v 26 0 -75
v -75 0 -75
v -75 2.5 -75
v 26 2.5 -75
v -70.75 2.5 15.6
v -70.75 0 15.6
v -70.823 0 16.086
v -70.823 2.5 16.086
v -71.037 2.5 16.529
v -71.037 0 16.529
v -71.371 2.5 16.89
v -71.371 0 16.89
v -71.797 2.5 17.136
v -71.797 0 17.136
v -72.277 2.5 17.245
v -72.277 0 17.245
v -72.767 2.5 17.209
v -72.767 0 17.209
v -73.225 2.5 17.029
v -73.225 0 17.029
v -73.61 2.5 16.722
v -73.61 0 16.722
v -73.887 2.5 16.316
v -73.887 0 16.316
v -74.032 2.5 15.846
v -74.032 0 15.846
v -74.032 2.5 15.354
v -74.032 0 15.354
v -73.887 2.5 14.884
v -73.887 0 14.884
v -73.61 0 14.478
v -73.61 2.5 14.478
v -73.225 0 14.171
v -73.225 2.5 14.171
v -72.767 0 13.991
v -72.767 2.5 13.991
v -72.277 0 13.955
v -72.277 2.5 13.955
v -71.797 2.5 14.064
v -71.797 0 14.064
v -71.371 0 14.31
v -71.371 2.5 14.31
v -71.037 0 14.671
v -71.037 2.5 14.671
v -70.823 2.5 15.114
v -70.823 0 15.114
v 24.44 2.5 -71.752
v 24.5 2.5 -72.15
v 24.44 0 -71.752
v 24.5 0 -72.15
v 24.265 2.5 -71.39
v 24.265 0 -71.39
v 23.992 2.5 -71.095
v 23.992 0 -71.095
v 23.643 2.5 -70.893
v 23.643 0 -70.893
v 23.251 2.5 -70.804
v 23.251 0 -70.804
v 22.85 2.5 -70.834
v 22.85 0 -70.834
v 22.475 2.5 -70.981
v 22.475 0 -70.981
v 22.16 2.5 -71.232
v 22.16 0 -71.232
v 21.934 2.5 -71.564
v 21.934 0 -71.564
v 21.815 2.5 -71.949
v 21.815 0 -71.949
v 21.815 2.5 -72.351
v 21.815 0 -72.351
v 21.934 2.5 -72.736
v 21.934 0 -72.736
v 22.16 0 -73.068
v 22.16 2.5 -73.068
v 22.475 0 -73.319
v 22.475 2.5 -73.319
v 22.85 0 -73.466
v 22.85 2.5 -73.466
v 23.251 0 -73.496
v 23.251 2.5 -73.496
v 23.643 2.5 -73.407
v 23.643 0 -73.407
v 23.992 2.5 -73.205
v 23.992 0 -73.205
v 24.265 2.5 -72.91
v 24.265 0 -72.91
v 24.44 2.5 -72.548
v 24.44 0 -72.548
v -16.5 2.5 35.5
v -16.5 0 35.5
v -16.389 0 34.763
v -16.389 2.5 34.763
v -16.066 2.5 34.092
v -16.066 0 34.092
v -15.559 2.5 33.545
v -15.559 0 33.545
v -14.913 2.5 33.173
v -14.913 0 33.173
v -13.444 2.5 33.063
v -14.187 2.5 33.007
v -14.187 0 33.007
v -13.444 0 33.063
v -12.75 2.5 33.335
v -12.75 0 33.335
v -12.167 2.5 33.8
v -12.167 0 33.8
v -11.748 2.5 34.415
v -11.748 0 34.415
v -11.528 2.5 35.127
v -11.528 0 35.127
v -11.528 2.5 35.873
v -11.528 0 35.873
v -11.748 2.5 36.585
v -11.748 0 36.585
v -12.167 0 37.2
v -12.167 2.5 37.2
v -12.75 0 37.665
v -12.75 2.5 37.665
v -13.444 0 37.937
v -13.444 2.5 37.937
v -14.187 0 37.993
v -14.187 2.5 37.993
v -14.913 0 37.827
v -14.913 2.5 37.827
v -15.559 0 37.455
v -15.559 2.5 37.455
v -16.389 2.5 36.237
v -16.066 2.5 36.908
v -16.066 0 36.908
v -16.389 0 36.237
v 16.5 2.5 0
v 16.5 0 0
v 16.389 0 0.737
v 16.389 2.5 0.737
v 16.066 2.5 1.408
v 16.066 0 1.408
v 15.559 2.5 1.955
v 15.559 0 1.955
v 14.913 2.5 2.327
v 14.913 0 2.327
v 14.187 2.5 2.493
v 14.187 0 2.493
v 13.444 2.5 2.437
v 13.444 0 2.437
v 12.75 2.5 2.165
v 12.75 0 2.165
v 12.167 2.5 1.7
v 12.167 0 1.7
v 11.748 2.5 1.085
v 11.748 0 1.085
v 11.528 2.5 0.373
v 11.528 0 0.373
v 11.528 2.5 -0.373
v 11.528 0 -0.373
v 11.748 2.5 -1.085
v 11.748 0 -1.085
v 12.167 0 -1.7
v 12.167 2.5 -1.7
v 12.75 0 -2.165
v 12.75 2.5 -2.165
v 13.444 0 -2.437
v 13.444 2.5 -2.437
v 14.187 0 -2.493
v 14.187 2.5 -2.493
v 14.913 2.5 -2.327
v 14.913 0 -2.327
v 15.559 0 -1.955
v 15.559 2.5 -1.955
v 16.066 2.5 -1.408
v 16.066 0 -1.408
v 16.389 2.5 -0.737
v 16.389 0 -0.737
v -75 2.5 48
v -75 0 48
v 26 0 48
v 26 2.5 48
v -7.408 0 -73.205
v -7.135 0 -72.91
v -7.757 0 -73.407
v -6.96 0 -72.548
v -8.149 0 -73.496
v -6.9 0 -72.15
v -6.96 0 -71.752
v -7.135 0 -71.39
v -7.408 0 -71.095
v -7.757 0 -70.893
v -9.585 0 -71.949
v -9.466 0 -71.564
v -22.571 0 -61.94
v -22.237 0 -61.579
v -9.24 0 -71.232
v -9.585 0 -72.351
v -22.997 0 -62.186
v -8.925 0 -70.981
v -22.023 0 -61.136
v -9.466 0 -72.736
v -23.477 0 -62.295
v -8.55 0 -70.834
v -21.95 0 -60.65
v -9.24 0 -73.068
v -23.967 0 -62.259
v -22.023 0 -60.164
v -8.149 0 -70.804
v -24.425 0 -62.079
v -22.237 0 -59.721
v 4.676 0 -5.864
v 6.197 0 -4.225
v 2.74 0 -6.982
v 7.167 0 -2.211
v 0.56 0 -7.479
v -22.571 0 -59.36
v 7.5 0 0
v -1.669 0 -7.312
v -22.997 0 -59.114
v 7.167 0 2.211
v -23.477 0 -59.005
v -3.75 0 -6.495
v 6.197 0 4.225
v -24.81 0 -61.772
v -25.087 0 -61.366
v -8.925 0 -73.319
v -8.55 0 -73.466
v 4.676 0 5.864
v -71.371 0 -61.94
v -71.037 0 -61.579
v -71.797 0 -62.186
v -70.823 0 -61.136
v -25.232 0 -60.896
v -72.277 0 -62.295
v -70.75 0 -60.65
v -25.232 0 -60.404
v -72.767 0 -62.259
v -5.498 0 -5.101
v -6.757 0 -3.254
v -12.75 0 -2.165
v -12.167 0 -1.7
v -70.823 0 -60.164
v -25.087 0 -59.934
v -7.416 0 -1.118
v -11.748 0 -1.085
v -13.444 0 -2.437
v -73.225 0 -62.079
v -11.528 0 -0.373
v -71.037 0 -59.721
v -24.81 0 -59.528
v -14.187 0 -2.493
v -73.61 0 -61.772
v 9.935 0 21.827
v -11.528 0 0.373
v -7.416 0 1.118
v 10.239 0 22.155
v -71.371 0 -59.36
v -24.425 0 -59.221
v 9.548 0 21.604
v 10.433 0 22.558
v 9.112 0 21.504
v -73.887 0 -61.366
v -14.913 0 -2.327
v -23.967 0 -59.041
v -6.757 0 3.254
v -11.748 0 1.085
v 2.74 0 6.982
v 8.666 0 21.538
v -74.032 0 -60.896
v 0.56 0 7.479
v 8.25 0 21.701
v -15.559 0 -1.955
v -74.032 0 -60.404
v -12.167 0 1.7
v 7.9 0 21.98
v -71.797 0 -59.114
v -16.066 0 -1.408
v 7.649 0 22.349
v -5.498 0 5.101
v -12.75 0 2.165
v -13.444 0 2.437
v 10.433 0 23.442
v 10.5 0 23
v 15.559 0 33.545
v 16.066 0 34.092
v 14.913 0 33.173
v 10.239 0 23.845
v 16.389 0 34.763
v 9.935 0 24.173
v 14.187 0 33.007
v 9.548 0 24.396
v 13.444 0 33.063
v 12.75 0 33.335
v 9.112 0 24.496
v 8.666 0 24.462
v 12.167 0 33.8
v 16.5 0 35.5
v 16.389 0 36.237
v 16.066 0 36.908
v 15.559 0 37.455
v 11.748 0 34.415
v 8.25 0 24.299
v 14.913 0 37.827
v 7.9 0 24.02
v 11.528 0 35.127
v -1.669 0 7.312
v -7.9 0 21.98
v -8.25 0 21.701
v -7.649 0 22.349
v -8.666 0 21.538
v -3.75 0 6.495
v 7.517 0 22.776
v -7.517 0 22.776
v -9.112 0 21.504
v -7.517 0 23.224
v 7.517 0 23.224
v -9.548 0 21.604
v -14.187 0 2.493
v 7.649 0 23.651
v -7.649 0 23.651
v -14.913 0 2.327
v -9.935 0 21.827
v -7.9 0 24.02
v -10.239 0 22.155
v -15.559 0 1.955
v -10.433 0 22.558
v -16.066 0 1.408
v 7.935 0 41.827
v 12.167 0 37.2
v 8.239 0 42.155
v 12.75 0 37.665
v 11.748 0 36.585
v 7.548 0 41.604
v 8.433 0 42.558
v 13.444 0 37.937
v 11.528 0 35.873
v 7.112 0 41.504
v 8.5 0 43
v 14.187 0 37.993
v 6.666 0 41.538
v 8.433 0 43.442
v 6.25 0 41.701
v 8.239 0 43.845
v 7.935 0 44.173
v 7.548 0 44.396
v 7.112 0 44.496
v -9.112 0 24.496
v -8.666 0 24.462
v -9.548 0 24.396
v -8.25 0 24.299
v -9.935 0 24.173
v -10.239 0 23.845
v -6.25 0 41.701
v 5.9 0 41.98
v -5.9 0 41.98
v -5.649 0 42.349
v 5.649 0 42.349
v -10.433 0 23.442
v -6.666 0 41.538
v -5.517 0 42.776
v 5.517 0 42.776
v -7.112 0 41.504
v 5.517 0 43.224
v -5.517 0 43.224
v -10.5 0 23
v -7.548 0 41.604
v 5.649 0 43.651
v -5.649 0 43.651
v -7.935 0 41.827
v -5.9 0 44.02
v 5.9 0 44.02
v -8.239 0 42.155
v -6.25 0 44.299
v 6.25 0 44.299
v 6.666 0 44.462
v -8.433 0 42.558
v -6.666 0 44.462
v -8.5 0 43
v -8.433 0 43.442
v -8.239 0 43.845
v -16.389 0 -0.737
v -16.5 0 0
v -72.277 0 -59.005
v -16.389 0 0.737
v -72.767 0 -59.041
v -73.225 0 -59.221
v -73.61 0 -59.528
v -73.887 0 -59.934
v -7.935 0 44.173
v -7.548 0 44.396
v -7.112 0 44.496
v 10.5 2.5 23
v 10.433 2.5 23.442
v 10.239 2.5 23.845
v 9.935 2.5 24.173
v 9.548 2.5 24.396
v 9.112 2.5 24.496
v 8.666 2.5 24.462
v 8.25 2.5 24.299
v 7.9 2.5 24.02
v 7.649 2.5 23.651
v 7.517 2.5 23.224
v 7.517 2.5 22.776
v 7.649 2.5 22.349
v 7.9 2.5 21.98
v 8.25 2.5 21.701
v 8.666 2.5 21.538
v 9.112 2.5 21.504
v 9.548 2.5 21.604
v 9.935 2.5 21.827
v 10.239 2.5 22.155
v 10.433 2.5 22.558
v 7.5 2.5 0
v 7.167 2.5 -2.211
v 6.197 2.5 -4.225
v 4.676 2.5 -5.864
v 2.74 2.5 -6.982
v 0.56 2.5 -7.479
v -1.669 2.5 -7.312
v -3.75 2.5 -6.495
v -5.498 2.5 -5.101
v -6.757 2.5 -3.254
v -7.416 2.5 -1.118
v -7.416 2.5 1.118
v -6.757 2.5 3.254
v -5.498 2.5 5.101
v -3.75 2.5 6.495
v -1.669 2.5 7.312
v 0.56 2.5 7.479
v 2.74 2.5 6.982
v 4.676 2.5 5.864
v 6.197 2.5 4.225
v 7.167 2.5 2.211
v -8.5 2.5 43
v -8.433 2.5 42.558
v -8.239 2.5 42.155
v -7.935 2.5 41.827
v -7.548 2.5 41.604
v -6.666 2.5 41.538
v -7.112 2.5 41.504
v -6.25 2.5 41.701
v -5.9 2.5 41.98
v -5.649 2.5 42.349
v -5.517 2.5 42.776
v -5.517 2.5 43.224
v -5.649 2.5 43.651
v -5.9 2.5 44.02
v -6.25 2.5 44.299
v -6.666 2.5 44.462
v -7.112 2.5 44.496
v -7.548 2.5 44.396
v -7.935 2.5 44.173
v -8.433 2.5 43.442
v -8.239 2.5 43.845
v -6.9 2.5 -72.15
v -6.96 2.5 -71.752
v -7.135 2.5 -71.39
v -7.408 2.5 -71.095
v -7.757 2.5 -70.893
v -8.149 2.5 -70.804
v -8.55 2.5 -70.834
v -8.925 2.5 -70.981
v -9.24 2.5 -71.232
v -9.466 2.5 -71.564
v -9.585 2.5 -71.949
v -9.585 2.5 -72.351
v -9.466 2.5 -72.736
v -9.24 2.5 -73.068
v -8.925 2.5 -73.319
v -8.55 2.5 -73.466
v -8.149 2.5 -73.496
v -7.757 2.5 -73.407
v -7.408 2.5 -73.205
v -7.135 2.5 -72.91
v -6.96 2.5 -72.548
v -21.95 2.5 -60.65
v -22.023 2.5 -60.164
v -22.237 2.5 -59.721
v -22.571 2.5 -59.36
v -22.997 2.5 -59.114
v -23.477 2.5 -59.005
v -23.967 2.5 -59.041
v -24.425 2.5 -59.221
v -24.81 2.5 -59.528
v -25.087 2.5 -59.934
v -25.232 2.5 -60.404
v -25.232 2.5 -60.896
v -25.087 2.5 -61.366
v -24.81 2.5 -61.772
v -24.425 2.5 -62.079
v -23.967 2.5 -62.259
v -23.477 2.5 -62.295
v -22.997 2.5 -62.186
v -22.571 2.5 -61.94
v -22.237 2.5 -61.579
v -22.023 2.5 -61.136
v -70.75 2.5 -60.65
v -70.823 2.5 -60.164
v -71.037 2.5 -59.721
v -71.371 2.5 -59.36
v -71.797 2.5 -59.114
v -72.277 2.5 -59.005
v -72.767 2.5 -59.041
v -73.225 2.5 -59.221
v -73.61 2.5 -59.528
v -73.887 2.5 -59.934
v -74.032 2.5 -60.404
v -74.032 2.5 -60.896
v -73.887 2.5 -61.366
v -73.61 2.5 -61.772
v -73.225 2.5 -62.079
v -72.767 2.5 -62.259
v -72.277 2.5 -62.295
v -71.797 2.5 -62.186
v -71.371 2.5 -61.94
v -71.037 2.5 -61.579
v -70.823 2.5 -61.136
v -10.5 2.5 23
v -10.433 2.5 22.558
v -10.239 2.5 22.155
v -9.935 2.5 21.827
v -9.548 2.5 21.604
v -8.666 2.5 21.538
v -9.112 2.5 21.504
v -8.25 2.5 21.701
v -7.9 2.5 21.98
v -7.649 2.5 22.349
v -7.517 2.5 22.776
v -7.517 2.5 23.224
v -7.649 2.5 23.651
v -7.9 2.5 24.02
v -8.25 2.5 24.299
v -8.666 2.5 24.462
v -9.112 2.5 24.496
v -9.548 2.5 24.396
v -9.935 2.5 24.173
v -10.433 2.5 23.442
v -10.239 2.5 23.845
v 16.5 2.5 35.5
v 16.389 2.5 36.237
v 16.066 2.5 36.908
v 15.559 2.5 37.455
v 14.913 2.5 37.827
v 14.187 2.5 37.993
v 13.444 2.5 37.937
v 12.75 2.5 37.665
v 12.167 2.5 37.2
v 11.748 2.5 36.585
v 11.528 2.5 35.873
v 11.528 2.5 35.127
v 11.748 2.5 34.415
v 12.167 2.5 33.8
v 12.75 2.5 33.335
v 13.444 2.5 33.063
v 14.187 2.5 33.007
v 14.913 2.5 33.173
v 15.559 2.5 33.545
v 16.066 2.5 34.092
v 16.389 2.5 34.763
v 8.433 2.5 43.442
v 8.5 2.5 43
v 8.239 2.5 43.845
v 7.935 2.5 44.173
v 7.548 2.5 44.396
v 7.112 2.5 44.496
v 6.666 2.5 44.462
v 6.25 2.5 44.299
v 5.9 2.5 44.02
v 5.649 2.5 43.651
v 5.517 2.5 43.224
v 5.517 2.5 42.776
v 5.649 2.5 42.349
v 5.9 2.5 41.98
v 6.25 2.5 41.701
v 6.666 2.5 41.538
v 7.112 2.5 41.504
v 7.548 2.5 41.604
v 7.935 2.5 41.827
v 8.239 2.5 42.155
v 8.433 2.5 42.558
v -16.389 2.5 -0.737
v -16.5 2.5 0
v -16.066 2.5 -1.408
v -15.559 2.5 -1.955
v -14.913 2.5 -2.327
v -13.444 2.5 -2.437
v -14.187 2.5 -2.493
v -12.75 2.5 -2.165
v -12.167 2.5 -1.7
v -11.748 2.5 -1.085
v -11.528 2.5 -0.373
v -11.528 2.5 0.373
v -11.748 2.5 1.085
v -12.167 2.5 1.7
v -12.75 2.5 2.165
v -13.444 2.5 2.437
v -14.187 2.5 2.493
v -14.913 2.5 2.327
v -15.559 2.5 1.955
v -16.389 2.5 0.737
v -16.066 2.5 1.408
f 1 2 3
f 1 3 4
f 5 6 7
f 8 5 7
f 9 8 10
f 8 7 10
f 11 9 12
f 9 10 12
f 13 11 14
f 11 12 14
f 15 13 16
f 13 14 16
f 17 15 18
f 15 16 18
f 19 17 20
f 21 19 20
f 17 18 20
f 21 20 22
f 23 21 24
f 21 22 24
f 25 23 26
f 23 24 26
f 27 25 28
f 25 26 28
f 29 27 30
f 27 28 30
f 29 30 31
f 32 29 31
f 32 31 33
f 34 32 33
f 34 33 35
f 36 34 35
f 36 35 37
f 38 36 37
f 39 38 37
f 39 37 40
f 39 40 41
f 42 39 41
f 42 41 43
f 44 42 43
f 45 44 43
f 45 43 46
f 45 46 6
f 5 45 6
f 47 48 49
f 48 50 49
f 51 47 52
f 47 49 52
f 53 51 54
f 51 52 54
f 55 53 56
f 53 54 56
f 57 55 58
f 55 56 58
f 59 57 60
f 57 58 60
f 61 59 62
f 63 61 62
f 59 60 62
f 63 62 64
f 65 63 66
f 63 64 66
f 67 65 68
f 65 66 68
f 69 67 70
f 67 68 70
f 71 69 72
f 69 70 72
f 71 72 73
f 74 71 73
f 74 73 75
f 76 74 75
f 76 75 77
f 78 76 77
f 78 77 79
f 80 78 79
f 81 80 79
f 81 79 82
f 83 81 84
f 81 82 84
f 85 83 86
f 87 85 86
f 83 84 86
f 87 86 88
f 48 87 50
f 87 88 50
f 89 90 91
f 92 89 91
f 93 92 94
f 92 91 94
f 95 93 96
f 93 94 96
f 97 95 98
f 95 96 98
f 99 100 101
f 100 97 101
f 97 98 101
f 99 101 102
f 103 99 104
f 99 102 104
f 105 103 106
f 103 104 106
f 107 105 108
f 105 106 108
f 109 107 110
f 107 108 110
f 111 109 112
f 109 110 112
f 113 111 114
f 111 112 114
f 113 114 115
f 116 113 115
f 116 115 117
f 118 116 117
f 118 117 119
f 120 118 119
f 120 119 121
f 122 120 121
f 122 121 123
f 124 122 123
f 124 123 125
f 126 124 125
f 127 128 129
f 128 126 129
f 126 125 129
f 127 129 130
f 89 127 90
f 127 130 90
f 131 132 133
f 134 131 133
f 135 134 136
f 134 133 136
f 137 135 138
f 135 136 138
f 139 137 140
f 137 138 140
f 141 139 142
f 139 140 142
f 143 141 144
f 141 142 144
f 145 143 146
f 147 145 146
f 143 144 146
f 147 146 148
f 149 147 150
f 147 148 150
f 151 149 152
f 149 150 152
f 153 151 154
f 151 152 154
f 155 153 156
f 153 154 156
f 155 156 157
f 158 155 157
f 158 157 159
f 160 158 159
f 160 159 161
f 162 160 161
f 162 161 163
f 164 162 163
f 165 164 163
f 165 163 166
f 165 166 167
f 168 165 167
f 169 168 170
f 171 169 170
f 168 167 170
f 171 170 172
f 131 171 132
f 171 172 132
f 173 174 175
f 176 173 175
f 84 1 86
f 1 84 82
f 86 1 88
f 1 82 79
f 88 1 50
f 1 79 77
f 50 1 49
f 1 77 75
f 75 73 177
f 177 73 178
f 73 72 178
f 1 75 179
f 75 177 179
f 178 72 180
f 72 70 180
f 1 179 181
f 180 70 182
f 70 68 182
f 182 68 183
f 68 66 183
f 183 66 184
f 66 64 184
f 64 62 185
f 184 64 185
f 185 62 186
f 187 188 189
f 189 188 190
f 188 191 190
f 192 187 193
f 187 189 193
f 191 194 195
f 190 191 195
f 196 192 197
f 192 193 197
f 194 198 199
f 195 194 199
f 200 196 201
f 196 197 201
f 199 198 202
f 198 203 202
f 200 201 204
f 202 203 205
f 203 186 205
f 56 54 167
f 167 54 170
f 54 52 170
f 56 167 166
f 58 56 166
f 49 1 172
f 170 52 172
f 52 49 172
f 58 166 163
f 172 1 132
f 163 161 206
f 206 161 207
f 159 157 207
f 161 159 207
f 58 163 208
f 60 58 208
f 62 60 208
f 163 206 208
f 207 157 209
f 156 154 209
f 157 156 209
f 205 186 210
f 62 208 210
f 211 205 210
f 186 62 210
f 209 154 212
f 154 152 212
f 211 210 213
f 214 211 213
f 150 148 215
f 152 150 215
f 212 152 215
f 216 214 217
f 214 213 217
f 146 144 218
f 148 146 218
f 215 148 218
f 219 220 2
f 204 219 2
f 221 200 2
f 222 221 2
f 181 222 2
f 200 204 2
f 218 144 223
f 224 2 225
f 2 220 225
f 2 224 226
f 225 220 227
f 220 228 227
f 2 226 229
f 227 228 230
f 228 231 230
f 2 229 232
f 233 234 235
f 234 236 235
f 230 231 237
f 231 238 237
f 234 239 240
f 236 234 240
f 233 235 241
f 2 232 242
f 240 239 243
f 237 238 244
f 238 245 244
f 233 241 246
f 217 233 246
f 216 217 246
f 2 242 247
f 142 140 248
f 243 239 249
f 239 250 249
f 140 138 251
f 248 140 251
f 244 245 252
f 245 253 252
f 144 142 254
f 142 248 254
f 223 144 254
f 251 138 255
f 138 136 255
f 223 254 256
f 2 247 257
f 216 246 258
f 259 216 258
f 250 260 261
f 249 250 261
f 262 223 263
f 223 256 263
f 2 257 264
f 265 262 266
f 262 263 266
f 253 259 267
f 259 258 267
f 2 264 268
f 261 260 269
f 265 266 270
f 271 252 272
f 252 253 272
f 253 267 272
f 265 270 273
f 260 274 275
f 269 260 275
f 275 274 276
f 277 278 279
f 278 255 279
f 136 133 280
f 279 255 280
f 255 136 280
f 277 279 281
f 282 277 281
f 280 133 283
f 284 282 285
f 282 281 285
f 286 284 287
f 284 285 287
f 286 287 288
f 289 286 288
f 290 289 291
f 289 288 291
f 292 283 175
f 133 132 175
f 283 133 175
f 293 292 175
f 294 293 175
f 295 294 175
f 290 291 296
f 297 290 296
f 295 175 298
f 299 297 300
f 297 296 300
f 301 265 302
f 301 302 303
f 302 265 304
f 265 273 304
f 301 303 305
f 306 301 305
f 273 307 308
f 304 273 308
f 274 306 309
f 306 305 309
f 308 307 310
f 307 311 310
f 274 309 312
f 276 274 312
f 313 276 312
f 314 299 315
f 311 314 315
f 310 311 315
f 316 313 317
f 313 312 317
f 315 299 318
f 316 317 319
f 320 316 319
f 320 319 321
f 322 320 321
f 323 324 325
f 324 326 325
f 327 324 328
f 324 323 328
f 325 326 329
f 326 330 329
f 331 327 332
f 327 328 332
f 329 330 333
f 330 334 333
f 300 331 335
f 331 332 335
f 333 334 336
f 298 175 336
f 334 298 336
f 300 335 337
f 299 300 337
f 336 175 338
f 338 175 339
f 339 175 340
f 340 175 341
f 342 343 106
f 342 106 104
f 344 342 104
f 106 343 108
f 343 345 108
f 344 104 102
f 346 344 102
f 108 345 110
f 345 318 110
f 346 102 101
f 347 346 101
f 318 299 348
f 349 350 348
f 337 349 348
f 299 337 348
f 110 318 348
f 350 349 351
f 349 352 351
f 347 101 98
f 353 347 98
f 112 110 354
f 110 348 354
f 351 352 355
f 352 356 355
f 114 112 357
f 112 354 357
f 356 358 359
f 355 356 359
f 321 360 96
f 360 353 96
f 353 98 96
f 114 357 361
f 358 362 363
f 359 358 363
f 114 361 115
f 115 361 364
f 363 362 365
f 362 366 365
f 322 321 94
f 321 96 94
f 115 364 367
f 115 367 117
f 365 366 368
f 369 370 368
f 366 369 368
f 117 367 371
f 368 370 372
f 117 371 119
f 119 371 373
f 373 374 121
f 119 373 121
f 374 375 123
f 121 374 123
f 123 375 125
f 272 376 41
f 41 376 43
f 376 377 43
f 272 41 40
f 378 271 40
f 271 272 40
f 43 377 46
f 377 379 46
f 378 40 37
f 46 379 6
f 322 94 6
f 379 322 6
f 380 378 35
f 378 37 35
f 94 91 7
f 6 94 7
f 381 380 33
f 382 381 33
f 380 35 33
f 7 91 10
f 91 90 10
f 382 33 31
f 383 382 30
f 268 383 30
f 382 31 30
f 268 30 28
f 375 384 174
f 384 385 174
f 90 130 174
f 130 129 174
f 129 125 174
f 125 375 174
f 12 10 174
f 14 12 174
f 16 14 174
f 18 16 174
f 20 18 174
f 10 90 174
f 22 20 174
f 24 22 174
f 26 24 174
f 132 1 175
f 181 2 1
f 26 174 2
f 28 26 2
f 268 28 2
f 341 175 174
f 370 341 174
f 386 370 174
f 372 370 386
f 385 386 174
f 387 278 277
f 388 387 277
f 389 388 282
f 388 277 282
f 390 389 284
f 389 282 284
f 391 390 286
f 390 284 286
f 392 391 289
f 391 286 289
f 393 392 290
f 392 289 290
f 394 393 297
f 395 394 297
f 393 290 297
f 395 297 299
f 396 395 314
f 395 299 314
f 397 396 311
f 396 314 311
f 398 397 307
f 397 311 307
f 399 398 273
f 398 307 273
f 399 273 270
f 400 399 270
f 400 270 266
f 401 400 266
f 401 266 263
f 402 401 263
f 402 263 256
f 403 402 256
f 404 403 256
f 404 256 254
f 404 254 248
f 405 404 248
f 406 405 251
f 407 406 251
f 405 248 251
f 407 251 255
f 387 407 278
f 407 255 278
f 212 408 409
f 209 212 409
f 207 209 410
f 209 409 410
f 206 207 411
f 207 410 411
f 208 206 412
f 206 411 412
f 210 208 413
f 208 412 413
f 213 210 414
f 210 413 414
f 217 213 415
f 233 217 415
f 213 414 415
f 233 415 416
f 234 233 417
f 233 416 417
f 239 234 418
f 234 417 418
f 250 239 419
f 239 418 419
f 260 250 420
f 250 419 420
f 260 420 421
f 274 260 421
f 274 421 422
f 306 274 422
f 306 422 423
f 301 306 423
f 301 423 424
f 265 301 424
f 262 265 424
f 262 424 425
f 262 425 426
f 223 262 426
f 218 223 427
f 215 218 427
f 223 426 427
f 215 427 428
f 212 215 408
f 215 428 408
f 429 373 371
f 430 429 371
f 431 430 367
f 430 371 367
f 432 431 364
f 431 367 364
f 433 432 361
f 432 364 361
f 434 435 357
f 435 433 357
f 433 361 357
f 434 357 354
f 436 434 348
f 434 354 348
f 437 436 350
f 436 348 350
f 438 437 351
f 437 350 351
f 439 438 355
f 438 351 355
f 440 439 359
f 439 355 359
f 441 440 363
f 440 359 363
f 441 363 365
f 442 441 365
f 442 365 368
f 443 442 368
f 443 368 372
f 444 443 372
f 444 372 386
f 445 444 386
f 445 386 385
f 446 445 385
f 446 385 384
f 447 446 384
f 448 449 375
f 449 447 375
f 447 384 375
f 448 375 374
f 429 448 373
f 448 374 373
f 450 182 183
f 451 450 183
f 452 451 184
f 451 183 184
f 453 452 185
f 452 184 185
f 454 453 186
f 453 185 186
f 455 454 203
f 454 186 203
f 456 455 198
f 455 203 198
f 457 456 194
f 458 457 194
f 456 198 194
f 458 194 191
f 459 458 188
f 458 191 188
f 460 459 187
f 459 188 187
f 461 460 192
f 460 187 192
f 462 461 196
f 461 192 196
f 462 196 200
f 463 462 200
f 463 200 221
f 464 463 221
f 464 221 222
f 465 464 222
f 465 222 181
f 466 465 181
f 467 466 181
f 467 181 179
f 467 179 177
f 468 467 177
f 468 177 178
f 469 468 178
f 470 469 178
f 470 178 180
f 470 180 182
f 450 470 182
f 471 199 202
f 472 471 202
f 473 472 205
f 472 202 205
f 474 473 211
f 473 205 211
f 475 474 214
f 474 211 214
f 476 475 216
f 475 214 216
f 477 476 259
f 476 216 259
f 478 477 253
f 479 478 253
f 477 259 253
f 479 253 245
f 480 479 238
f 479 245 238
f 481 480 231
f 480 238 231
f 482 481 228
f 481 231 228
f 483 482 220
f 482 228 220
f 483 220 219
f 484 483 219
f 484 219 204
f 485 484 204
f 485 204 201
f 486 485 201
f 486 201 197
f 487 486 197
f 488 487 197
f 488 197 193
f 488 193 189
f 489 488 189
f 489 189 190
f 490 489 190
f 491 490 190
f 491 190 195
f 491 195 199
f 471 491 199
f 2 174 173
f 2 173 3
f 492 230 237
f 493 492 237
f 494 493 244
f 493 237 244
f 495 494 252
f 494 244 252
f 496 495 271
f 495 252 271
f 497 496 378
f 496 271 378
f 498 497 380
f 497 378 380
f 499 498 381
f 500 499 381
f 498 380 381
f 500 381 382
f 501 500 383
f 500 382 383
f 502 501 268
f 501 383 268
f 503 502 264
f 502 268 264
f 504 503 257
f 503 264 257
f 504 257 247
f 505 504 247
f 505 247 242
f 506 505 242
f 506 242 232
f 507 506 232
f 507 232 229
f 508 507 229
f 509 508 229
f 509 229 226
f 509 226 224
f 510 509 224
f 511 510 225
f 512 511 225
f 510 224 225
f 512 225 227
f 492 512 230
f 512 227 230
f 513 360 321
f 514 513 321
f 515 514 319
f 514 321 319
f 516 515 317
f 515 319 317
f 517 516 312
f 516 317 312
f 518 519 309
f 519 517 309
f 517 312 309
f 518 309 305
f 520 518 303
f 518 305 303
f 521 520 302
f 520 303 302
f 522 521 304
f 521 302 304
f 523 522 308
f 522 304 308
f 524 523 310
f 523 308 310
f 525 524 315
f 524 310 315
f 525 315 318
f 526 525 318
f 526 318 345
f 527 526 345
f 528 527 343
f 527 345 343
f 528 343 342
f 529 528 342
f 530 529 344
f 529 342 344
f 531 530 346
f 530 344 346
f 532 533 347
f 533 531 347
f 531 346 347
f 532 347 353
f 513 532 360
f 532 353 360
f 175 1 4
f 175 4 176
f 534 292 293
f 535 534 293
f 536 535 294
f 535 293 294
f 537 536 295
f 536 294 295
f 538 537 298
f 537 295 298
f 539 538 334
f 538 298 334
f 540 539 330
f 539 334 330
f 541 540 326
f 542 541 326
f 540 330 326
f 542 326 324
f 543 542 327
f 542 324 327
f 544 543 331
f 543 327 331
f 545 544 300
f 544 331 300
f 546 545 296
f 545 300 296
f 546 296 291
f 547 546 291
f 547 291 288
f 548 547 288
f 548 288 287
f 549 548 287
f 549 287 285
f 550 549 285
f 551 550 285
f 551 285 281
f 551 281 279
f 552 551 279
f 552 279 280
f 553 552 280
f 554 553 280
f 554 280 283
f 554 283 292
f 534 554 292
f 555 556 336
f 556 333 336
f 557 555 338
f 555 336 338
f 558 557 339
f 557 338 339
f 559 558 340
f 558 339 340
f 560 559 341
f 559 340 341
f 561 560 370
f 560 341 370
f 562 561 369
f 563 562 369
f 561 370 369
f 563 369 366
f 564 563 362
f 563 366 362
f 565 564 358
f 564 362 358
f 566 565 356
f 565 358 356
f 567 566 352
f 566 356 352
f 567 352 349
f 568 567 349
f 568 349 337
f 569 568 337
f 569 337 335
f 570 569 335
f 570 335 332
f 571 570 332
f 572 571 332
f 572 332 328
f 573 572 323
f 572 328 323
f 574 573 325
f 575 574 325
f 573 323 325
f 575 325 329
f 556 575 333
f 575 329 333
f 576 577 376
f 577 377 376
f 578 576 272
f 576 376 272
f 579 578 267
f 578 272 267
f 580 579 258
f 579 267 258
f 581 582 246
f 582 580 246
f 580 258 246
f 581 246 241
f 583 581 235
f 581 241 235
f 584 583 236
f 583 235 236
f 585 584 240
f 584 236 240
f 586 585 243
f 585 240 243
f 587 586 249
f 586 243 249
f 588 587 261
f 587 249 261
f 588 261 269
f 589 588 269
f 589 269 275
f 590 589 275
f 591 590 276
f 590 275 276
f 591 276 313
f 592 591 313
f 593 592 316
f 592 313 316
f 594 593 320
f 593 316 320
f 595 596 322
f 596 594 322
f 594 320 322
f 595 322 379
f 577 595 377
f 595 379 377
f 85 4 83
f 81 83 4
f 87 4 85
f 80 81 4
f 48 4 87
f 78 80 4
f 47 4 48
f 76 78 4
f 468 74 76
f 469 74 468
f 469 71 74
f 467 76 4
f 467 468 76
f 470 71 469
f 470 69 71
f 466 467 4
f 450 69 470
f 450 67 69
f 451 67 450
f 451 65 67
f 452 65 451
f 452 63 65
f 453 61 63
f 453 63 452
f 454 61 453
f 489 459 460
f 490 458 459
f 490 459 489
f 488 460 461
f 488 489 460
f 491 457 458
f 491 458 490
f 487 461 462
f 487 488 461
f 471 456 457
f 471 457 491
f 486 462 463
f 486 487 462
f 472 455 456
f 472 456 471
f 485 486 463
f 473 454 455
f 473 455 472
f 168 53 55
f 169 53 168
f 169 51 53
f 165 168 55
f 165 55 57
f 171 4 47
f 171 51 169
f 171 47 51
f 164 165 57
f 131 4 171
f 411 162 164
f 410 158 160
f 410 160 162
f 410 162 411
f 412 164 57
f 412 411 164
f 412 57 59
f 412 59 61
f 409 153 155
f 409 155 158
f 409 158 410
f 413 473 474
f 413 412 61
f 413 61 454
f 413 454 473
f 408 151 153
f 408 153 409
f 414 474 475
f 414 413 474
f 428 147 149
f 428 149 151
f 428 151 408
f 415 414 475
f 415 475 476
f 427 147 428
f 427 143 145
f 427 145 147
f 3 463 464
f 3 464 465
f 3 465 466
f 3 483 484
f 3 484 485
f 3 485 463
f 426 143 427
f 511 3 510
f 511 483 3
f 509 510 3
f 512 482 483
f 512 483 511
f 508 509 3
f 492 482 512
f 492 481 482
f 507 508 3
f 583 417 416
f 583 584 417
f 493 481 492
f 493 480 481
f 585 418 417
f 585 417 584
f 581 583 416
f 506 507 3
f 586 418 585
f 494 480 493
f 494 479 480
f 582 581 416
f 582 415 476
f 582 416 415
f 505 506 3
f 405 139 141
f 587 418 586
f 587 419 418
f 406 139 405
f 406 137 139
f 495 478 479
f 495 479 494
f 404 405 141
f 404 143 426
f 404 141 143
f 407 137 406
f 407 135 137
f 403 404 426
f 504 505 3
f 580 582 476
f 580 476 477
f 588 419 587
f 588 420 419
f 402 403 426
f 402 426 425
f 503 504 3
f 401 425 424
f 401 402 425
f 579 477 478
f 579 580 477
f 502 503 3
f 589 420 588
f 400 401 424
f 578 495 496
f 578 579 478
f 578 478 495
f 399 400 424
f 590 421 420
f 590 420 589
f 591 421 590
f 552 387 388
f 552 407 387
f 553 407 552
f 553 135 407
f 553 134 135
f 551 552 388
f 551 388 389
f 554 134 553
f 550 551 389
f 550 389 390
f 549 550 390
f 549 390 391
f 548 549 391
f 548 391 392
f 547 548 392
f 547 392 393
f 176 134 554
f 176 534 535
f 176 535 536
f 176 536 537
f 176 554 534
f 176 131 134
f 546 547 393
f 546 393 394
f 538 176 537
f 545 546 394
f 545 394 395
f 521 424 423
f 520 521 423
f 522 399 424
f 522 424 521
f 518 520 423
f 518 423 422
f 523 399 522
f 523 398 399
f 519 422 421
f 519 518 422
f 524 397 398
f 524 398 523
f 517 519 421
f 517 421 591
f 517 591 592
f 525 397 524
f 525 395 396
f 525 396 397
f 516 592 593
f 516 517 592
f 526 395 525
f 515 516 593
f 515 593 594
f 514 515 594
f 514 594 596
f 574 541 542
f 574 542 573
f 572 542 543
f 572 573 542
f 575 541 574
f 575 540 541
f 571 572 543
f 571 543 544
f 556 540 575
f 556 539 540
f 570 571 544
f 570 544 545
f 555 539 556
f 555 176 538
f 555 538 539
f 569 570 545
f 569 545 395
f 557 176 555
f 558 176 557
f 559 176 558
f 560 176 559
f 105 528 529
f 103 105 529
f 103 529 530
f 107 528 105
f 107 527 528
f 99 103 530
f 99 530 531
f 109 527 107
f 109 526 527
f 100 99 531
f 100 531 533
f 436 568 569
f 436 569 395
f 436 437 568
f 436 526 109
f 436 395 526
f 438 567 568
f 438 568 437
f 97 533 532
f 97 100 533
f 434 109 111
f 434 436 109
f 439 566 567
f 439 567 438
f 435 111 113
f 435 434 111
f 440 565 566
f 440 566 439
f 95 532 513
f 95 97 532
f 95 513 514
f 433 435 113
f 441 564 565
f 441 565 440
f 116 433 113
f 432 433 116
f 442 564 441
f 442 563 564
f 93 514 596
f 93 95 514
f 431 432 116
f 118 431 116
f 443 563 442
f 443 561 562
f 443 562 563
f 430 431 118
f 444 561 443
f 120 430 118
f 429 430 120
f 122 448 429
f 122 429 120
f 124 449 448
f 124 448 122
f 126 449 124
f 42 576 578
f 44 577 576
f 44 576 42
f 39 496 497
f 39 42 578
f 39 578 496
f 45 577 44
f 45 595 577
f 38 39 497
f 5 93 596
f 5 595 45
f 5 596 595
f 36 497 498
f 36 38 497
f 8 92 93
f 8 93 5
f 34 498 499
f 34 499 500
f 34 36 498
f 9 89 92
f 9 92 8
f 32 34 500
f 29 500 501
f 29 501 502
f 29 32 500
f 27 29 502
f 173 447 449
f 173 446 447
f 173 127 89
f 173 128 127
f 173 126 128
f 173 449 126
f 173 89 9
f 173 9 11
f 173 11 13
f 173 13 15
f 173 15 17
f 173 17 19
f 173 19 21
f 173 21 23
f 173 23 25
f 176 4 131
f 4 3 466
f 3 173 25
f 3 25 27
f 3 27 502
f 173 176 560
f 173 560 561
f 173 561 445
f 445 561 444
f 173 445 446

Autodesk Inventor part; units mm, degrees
ref_plane "YZ Plane" through (0, 0, 0) normal (1, 0, 0) x (0, 1, 0)
ref_plane "XZ Plane" through (0, 0, 0) normal (0, 1, 0) x (-1, 0, 0)
sketch "Sketch1" plane through (0, 0, 0) normal (0, 1, 0) x (-1, 0, 0)
  line L0 (75, 48) -> (75, -75)
  line L1 (75, -75) -> (-26, -75)
  line L2 (-26, -75) -> (-26, 48)
  line L3 (75, 48) -> (-26, 48)
  point P0 (0, 0)
extrude "Extrusion1" add sketch "Sketch1" along normal blind 2.5
sketch "Sketch2" plane through (0, 2.5, 0) normal (0, 1, 0) x (1, 0, 0)
  circle A0 centre (0, 0) radius 7.5
  dimension "d4" = 15
extrude "Extrusion2" cut sketch "Sketch2" against normal blind 2.5
ref_plane "Work Plane1" through (0, 0, 48) normal (1, 0, 0) x (0, 0, -1)
sketch "Sketch3" plane through (0, 0, 0) normal (0, -1, 0) x (1, 0, 0)
  circle A0 centre (7, 43) radius 1.5
  line L0 (26, 48) -> (26, -75) projected
  line L1 (-75, 48) -> (26, 48) projected
  circle A1 centre (9, 23) radius 1.5
  point P0 (0, 0)
  dimension "d12" = 3
  dimension "d15" = 19
  dimension "d18" = 3
  dimension "d19" = 17
  dimension "d20" = 25
  dimension "d21" = 5
extrude "Extrusion3" cut sketch "Sketch3" against normal blind 2.5
mirror "Mirror1" about plane through (0, 0, 48) normal (1, 0, 0) of "Extrusion3"
sketch "Sketch4" plane through (0, 0, 0) normal (0, -1, 0) x (1, 0, 0)
  line L0 (-75, 48) -> (26, 48) projected
  circle A0 centre (14, 35.5) radius 2.5
  circle A1 centre (14, 0) radius 2.5
  point P0 (0, 0)
  dimension "d24" = 5
  dimension "d28" = 5
  dimension "d29" = 14
  dimension "d30" = 14
extrude "Extrusion4" cut sketch "Sketch4" against normal blind 2.5
mirror "Mirror2" about plane through (0, 0, 48) normal (1, 0, 0) of "Extrusion4"
sketch "Sketch5" plane through (0, 0, 0) normal (0, -1, 0) x (1, 0, 0)
  line L0 (26, 48) -> (26, -75) projected
  circle A0 centre (23.15, -72.15) radius 1.35
  point P0 (0, 0)
  dimension "d33" = 2.7
extrude "Extrusion5" cut sketch "Sketch5" against normal blind 2.5
pattern_linear "Rectangular Pattern1" count 2 spacing 31.4 along (-1, 0, 0) of "Extrusion5"
sketch "Sketch6" plane through (0, 0, 0) normal (0, -1, 0) x (1, 0, 0)
  circle A0 centre (-72.4, -60.65) radius 1.65
  point P0 (0, 0)
  point P1 (-75, -75)
  dimension "d41" = 3.3
extrude "Extrusion6" cut sketch "Sketch6" against normal blind 2.5
pattern_linear "Rectangular Pattern2" count 2 spacing 48.8 along (1, 0, 0) of "Extrusion6"
pattern_linear "Rectangular Pattern3" count 2 spacing 76.25 along (0, 0, 1) of "Extrusion6"
properties part number "BaseMDF"
